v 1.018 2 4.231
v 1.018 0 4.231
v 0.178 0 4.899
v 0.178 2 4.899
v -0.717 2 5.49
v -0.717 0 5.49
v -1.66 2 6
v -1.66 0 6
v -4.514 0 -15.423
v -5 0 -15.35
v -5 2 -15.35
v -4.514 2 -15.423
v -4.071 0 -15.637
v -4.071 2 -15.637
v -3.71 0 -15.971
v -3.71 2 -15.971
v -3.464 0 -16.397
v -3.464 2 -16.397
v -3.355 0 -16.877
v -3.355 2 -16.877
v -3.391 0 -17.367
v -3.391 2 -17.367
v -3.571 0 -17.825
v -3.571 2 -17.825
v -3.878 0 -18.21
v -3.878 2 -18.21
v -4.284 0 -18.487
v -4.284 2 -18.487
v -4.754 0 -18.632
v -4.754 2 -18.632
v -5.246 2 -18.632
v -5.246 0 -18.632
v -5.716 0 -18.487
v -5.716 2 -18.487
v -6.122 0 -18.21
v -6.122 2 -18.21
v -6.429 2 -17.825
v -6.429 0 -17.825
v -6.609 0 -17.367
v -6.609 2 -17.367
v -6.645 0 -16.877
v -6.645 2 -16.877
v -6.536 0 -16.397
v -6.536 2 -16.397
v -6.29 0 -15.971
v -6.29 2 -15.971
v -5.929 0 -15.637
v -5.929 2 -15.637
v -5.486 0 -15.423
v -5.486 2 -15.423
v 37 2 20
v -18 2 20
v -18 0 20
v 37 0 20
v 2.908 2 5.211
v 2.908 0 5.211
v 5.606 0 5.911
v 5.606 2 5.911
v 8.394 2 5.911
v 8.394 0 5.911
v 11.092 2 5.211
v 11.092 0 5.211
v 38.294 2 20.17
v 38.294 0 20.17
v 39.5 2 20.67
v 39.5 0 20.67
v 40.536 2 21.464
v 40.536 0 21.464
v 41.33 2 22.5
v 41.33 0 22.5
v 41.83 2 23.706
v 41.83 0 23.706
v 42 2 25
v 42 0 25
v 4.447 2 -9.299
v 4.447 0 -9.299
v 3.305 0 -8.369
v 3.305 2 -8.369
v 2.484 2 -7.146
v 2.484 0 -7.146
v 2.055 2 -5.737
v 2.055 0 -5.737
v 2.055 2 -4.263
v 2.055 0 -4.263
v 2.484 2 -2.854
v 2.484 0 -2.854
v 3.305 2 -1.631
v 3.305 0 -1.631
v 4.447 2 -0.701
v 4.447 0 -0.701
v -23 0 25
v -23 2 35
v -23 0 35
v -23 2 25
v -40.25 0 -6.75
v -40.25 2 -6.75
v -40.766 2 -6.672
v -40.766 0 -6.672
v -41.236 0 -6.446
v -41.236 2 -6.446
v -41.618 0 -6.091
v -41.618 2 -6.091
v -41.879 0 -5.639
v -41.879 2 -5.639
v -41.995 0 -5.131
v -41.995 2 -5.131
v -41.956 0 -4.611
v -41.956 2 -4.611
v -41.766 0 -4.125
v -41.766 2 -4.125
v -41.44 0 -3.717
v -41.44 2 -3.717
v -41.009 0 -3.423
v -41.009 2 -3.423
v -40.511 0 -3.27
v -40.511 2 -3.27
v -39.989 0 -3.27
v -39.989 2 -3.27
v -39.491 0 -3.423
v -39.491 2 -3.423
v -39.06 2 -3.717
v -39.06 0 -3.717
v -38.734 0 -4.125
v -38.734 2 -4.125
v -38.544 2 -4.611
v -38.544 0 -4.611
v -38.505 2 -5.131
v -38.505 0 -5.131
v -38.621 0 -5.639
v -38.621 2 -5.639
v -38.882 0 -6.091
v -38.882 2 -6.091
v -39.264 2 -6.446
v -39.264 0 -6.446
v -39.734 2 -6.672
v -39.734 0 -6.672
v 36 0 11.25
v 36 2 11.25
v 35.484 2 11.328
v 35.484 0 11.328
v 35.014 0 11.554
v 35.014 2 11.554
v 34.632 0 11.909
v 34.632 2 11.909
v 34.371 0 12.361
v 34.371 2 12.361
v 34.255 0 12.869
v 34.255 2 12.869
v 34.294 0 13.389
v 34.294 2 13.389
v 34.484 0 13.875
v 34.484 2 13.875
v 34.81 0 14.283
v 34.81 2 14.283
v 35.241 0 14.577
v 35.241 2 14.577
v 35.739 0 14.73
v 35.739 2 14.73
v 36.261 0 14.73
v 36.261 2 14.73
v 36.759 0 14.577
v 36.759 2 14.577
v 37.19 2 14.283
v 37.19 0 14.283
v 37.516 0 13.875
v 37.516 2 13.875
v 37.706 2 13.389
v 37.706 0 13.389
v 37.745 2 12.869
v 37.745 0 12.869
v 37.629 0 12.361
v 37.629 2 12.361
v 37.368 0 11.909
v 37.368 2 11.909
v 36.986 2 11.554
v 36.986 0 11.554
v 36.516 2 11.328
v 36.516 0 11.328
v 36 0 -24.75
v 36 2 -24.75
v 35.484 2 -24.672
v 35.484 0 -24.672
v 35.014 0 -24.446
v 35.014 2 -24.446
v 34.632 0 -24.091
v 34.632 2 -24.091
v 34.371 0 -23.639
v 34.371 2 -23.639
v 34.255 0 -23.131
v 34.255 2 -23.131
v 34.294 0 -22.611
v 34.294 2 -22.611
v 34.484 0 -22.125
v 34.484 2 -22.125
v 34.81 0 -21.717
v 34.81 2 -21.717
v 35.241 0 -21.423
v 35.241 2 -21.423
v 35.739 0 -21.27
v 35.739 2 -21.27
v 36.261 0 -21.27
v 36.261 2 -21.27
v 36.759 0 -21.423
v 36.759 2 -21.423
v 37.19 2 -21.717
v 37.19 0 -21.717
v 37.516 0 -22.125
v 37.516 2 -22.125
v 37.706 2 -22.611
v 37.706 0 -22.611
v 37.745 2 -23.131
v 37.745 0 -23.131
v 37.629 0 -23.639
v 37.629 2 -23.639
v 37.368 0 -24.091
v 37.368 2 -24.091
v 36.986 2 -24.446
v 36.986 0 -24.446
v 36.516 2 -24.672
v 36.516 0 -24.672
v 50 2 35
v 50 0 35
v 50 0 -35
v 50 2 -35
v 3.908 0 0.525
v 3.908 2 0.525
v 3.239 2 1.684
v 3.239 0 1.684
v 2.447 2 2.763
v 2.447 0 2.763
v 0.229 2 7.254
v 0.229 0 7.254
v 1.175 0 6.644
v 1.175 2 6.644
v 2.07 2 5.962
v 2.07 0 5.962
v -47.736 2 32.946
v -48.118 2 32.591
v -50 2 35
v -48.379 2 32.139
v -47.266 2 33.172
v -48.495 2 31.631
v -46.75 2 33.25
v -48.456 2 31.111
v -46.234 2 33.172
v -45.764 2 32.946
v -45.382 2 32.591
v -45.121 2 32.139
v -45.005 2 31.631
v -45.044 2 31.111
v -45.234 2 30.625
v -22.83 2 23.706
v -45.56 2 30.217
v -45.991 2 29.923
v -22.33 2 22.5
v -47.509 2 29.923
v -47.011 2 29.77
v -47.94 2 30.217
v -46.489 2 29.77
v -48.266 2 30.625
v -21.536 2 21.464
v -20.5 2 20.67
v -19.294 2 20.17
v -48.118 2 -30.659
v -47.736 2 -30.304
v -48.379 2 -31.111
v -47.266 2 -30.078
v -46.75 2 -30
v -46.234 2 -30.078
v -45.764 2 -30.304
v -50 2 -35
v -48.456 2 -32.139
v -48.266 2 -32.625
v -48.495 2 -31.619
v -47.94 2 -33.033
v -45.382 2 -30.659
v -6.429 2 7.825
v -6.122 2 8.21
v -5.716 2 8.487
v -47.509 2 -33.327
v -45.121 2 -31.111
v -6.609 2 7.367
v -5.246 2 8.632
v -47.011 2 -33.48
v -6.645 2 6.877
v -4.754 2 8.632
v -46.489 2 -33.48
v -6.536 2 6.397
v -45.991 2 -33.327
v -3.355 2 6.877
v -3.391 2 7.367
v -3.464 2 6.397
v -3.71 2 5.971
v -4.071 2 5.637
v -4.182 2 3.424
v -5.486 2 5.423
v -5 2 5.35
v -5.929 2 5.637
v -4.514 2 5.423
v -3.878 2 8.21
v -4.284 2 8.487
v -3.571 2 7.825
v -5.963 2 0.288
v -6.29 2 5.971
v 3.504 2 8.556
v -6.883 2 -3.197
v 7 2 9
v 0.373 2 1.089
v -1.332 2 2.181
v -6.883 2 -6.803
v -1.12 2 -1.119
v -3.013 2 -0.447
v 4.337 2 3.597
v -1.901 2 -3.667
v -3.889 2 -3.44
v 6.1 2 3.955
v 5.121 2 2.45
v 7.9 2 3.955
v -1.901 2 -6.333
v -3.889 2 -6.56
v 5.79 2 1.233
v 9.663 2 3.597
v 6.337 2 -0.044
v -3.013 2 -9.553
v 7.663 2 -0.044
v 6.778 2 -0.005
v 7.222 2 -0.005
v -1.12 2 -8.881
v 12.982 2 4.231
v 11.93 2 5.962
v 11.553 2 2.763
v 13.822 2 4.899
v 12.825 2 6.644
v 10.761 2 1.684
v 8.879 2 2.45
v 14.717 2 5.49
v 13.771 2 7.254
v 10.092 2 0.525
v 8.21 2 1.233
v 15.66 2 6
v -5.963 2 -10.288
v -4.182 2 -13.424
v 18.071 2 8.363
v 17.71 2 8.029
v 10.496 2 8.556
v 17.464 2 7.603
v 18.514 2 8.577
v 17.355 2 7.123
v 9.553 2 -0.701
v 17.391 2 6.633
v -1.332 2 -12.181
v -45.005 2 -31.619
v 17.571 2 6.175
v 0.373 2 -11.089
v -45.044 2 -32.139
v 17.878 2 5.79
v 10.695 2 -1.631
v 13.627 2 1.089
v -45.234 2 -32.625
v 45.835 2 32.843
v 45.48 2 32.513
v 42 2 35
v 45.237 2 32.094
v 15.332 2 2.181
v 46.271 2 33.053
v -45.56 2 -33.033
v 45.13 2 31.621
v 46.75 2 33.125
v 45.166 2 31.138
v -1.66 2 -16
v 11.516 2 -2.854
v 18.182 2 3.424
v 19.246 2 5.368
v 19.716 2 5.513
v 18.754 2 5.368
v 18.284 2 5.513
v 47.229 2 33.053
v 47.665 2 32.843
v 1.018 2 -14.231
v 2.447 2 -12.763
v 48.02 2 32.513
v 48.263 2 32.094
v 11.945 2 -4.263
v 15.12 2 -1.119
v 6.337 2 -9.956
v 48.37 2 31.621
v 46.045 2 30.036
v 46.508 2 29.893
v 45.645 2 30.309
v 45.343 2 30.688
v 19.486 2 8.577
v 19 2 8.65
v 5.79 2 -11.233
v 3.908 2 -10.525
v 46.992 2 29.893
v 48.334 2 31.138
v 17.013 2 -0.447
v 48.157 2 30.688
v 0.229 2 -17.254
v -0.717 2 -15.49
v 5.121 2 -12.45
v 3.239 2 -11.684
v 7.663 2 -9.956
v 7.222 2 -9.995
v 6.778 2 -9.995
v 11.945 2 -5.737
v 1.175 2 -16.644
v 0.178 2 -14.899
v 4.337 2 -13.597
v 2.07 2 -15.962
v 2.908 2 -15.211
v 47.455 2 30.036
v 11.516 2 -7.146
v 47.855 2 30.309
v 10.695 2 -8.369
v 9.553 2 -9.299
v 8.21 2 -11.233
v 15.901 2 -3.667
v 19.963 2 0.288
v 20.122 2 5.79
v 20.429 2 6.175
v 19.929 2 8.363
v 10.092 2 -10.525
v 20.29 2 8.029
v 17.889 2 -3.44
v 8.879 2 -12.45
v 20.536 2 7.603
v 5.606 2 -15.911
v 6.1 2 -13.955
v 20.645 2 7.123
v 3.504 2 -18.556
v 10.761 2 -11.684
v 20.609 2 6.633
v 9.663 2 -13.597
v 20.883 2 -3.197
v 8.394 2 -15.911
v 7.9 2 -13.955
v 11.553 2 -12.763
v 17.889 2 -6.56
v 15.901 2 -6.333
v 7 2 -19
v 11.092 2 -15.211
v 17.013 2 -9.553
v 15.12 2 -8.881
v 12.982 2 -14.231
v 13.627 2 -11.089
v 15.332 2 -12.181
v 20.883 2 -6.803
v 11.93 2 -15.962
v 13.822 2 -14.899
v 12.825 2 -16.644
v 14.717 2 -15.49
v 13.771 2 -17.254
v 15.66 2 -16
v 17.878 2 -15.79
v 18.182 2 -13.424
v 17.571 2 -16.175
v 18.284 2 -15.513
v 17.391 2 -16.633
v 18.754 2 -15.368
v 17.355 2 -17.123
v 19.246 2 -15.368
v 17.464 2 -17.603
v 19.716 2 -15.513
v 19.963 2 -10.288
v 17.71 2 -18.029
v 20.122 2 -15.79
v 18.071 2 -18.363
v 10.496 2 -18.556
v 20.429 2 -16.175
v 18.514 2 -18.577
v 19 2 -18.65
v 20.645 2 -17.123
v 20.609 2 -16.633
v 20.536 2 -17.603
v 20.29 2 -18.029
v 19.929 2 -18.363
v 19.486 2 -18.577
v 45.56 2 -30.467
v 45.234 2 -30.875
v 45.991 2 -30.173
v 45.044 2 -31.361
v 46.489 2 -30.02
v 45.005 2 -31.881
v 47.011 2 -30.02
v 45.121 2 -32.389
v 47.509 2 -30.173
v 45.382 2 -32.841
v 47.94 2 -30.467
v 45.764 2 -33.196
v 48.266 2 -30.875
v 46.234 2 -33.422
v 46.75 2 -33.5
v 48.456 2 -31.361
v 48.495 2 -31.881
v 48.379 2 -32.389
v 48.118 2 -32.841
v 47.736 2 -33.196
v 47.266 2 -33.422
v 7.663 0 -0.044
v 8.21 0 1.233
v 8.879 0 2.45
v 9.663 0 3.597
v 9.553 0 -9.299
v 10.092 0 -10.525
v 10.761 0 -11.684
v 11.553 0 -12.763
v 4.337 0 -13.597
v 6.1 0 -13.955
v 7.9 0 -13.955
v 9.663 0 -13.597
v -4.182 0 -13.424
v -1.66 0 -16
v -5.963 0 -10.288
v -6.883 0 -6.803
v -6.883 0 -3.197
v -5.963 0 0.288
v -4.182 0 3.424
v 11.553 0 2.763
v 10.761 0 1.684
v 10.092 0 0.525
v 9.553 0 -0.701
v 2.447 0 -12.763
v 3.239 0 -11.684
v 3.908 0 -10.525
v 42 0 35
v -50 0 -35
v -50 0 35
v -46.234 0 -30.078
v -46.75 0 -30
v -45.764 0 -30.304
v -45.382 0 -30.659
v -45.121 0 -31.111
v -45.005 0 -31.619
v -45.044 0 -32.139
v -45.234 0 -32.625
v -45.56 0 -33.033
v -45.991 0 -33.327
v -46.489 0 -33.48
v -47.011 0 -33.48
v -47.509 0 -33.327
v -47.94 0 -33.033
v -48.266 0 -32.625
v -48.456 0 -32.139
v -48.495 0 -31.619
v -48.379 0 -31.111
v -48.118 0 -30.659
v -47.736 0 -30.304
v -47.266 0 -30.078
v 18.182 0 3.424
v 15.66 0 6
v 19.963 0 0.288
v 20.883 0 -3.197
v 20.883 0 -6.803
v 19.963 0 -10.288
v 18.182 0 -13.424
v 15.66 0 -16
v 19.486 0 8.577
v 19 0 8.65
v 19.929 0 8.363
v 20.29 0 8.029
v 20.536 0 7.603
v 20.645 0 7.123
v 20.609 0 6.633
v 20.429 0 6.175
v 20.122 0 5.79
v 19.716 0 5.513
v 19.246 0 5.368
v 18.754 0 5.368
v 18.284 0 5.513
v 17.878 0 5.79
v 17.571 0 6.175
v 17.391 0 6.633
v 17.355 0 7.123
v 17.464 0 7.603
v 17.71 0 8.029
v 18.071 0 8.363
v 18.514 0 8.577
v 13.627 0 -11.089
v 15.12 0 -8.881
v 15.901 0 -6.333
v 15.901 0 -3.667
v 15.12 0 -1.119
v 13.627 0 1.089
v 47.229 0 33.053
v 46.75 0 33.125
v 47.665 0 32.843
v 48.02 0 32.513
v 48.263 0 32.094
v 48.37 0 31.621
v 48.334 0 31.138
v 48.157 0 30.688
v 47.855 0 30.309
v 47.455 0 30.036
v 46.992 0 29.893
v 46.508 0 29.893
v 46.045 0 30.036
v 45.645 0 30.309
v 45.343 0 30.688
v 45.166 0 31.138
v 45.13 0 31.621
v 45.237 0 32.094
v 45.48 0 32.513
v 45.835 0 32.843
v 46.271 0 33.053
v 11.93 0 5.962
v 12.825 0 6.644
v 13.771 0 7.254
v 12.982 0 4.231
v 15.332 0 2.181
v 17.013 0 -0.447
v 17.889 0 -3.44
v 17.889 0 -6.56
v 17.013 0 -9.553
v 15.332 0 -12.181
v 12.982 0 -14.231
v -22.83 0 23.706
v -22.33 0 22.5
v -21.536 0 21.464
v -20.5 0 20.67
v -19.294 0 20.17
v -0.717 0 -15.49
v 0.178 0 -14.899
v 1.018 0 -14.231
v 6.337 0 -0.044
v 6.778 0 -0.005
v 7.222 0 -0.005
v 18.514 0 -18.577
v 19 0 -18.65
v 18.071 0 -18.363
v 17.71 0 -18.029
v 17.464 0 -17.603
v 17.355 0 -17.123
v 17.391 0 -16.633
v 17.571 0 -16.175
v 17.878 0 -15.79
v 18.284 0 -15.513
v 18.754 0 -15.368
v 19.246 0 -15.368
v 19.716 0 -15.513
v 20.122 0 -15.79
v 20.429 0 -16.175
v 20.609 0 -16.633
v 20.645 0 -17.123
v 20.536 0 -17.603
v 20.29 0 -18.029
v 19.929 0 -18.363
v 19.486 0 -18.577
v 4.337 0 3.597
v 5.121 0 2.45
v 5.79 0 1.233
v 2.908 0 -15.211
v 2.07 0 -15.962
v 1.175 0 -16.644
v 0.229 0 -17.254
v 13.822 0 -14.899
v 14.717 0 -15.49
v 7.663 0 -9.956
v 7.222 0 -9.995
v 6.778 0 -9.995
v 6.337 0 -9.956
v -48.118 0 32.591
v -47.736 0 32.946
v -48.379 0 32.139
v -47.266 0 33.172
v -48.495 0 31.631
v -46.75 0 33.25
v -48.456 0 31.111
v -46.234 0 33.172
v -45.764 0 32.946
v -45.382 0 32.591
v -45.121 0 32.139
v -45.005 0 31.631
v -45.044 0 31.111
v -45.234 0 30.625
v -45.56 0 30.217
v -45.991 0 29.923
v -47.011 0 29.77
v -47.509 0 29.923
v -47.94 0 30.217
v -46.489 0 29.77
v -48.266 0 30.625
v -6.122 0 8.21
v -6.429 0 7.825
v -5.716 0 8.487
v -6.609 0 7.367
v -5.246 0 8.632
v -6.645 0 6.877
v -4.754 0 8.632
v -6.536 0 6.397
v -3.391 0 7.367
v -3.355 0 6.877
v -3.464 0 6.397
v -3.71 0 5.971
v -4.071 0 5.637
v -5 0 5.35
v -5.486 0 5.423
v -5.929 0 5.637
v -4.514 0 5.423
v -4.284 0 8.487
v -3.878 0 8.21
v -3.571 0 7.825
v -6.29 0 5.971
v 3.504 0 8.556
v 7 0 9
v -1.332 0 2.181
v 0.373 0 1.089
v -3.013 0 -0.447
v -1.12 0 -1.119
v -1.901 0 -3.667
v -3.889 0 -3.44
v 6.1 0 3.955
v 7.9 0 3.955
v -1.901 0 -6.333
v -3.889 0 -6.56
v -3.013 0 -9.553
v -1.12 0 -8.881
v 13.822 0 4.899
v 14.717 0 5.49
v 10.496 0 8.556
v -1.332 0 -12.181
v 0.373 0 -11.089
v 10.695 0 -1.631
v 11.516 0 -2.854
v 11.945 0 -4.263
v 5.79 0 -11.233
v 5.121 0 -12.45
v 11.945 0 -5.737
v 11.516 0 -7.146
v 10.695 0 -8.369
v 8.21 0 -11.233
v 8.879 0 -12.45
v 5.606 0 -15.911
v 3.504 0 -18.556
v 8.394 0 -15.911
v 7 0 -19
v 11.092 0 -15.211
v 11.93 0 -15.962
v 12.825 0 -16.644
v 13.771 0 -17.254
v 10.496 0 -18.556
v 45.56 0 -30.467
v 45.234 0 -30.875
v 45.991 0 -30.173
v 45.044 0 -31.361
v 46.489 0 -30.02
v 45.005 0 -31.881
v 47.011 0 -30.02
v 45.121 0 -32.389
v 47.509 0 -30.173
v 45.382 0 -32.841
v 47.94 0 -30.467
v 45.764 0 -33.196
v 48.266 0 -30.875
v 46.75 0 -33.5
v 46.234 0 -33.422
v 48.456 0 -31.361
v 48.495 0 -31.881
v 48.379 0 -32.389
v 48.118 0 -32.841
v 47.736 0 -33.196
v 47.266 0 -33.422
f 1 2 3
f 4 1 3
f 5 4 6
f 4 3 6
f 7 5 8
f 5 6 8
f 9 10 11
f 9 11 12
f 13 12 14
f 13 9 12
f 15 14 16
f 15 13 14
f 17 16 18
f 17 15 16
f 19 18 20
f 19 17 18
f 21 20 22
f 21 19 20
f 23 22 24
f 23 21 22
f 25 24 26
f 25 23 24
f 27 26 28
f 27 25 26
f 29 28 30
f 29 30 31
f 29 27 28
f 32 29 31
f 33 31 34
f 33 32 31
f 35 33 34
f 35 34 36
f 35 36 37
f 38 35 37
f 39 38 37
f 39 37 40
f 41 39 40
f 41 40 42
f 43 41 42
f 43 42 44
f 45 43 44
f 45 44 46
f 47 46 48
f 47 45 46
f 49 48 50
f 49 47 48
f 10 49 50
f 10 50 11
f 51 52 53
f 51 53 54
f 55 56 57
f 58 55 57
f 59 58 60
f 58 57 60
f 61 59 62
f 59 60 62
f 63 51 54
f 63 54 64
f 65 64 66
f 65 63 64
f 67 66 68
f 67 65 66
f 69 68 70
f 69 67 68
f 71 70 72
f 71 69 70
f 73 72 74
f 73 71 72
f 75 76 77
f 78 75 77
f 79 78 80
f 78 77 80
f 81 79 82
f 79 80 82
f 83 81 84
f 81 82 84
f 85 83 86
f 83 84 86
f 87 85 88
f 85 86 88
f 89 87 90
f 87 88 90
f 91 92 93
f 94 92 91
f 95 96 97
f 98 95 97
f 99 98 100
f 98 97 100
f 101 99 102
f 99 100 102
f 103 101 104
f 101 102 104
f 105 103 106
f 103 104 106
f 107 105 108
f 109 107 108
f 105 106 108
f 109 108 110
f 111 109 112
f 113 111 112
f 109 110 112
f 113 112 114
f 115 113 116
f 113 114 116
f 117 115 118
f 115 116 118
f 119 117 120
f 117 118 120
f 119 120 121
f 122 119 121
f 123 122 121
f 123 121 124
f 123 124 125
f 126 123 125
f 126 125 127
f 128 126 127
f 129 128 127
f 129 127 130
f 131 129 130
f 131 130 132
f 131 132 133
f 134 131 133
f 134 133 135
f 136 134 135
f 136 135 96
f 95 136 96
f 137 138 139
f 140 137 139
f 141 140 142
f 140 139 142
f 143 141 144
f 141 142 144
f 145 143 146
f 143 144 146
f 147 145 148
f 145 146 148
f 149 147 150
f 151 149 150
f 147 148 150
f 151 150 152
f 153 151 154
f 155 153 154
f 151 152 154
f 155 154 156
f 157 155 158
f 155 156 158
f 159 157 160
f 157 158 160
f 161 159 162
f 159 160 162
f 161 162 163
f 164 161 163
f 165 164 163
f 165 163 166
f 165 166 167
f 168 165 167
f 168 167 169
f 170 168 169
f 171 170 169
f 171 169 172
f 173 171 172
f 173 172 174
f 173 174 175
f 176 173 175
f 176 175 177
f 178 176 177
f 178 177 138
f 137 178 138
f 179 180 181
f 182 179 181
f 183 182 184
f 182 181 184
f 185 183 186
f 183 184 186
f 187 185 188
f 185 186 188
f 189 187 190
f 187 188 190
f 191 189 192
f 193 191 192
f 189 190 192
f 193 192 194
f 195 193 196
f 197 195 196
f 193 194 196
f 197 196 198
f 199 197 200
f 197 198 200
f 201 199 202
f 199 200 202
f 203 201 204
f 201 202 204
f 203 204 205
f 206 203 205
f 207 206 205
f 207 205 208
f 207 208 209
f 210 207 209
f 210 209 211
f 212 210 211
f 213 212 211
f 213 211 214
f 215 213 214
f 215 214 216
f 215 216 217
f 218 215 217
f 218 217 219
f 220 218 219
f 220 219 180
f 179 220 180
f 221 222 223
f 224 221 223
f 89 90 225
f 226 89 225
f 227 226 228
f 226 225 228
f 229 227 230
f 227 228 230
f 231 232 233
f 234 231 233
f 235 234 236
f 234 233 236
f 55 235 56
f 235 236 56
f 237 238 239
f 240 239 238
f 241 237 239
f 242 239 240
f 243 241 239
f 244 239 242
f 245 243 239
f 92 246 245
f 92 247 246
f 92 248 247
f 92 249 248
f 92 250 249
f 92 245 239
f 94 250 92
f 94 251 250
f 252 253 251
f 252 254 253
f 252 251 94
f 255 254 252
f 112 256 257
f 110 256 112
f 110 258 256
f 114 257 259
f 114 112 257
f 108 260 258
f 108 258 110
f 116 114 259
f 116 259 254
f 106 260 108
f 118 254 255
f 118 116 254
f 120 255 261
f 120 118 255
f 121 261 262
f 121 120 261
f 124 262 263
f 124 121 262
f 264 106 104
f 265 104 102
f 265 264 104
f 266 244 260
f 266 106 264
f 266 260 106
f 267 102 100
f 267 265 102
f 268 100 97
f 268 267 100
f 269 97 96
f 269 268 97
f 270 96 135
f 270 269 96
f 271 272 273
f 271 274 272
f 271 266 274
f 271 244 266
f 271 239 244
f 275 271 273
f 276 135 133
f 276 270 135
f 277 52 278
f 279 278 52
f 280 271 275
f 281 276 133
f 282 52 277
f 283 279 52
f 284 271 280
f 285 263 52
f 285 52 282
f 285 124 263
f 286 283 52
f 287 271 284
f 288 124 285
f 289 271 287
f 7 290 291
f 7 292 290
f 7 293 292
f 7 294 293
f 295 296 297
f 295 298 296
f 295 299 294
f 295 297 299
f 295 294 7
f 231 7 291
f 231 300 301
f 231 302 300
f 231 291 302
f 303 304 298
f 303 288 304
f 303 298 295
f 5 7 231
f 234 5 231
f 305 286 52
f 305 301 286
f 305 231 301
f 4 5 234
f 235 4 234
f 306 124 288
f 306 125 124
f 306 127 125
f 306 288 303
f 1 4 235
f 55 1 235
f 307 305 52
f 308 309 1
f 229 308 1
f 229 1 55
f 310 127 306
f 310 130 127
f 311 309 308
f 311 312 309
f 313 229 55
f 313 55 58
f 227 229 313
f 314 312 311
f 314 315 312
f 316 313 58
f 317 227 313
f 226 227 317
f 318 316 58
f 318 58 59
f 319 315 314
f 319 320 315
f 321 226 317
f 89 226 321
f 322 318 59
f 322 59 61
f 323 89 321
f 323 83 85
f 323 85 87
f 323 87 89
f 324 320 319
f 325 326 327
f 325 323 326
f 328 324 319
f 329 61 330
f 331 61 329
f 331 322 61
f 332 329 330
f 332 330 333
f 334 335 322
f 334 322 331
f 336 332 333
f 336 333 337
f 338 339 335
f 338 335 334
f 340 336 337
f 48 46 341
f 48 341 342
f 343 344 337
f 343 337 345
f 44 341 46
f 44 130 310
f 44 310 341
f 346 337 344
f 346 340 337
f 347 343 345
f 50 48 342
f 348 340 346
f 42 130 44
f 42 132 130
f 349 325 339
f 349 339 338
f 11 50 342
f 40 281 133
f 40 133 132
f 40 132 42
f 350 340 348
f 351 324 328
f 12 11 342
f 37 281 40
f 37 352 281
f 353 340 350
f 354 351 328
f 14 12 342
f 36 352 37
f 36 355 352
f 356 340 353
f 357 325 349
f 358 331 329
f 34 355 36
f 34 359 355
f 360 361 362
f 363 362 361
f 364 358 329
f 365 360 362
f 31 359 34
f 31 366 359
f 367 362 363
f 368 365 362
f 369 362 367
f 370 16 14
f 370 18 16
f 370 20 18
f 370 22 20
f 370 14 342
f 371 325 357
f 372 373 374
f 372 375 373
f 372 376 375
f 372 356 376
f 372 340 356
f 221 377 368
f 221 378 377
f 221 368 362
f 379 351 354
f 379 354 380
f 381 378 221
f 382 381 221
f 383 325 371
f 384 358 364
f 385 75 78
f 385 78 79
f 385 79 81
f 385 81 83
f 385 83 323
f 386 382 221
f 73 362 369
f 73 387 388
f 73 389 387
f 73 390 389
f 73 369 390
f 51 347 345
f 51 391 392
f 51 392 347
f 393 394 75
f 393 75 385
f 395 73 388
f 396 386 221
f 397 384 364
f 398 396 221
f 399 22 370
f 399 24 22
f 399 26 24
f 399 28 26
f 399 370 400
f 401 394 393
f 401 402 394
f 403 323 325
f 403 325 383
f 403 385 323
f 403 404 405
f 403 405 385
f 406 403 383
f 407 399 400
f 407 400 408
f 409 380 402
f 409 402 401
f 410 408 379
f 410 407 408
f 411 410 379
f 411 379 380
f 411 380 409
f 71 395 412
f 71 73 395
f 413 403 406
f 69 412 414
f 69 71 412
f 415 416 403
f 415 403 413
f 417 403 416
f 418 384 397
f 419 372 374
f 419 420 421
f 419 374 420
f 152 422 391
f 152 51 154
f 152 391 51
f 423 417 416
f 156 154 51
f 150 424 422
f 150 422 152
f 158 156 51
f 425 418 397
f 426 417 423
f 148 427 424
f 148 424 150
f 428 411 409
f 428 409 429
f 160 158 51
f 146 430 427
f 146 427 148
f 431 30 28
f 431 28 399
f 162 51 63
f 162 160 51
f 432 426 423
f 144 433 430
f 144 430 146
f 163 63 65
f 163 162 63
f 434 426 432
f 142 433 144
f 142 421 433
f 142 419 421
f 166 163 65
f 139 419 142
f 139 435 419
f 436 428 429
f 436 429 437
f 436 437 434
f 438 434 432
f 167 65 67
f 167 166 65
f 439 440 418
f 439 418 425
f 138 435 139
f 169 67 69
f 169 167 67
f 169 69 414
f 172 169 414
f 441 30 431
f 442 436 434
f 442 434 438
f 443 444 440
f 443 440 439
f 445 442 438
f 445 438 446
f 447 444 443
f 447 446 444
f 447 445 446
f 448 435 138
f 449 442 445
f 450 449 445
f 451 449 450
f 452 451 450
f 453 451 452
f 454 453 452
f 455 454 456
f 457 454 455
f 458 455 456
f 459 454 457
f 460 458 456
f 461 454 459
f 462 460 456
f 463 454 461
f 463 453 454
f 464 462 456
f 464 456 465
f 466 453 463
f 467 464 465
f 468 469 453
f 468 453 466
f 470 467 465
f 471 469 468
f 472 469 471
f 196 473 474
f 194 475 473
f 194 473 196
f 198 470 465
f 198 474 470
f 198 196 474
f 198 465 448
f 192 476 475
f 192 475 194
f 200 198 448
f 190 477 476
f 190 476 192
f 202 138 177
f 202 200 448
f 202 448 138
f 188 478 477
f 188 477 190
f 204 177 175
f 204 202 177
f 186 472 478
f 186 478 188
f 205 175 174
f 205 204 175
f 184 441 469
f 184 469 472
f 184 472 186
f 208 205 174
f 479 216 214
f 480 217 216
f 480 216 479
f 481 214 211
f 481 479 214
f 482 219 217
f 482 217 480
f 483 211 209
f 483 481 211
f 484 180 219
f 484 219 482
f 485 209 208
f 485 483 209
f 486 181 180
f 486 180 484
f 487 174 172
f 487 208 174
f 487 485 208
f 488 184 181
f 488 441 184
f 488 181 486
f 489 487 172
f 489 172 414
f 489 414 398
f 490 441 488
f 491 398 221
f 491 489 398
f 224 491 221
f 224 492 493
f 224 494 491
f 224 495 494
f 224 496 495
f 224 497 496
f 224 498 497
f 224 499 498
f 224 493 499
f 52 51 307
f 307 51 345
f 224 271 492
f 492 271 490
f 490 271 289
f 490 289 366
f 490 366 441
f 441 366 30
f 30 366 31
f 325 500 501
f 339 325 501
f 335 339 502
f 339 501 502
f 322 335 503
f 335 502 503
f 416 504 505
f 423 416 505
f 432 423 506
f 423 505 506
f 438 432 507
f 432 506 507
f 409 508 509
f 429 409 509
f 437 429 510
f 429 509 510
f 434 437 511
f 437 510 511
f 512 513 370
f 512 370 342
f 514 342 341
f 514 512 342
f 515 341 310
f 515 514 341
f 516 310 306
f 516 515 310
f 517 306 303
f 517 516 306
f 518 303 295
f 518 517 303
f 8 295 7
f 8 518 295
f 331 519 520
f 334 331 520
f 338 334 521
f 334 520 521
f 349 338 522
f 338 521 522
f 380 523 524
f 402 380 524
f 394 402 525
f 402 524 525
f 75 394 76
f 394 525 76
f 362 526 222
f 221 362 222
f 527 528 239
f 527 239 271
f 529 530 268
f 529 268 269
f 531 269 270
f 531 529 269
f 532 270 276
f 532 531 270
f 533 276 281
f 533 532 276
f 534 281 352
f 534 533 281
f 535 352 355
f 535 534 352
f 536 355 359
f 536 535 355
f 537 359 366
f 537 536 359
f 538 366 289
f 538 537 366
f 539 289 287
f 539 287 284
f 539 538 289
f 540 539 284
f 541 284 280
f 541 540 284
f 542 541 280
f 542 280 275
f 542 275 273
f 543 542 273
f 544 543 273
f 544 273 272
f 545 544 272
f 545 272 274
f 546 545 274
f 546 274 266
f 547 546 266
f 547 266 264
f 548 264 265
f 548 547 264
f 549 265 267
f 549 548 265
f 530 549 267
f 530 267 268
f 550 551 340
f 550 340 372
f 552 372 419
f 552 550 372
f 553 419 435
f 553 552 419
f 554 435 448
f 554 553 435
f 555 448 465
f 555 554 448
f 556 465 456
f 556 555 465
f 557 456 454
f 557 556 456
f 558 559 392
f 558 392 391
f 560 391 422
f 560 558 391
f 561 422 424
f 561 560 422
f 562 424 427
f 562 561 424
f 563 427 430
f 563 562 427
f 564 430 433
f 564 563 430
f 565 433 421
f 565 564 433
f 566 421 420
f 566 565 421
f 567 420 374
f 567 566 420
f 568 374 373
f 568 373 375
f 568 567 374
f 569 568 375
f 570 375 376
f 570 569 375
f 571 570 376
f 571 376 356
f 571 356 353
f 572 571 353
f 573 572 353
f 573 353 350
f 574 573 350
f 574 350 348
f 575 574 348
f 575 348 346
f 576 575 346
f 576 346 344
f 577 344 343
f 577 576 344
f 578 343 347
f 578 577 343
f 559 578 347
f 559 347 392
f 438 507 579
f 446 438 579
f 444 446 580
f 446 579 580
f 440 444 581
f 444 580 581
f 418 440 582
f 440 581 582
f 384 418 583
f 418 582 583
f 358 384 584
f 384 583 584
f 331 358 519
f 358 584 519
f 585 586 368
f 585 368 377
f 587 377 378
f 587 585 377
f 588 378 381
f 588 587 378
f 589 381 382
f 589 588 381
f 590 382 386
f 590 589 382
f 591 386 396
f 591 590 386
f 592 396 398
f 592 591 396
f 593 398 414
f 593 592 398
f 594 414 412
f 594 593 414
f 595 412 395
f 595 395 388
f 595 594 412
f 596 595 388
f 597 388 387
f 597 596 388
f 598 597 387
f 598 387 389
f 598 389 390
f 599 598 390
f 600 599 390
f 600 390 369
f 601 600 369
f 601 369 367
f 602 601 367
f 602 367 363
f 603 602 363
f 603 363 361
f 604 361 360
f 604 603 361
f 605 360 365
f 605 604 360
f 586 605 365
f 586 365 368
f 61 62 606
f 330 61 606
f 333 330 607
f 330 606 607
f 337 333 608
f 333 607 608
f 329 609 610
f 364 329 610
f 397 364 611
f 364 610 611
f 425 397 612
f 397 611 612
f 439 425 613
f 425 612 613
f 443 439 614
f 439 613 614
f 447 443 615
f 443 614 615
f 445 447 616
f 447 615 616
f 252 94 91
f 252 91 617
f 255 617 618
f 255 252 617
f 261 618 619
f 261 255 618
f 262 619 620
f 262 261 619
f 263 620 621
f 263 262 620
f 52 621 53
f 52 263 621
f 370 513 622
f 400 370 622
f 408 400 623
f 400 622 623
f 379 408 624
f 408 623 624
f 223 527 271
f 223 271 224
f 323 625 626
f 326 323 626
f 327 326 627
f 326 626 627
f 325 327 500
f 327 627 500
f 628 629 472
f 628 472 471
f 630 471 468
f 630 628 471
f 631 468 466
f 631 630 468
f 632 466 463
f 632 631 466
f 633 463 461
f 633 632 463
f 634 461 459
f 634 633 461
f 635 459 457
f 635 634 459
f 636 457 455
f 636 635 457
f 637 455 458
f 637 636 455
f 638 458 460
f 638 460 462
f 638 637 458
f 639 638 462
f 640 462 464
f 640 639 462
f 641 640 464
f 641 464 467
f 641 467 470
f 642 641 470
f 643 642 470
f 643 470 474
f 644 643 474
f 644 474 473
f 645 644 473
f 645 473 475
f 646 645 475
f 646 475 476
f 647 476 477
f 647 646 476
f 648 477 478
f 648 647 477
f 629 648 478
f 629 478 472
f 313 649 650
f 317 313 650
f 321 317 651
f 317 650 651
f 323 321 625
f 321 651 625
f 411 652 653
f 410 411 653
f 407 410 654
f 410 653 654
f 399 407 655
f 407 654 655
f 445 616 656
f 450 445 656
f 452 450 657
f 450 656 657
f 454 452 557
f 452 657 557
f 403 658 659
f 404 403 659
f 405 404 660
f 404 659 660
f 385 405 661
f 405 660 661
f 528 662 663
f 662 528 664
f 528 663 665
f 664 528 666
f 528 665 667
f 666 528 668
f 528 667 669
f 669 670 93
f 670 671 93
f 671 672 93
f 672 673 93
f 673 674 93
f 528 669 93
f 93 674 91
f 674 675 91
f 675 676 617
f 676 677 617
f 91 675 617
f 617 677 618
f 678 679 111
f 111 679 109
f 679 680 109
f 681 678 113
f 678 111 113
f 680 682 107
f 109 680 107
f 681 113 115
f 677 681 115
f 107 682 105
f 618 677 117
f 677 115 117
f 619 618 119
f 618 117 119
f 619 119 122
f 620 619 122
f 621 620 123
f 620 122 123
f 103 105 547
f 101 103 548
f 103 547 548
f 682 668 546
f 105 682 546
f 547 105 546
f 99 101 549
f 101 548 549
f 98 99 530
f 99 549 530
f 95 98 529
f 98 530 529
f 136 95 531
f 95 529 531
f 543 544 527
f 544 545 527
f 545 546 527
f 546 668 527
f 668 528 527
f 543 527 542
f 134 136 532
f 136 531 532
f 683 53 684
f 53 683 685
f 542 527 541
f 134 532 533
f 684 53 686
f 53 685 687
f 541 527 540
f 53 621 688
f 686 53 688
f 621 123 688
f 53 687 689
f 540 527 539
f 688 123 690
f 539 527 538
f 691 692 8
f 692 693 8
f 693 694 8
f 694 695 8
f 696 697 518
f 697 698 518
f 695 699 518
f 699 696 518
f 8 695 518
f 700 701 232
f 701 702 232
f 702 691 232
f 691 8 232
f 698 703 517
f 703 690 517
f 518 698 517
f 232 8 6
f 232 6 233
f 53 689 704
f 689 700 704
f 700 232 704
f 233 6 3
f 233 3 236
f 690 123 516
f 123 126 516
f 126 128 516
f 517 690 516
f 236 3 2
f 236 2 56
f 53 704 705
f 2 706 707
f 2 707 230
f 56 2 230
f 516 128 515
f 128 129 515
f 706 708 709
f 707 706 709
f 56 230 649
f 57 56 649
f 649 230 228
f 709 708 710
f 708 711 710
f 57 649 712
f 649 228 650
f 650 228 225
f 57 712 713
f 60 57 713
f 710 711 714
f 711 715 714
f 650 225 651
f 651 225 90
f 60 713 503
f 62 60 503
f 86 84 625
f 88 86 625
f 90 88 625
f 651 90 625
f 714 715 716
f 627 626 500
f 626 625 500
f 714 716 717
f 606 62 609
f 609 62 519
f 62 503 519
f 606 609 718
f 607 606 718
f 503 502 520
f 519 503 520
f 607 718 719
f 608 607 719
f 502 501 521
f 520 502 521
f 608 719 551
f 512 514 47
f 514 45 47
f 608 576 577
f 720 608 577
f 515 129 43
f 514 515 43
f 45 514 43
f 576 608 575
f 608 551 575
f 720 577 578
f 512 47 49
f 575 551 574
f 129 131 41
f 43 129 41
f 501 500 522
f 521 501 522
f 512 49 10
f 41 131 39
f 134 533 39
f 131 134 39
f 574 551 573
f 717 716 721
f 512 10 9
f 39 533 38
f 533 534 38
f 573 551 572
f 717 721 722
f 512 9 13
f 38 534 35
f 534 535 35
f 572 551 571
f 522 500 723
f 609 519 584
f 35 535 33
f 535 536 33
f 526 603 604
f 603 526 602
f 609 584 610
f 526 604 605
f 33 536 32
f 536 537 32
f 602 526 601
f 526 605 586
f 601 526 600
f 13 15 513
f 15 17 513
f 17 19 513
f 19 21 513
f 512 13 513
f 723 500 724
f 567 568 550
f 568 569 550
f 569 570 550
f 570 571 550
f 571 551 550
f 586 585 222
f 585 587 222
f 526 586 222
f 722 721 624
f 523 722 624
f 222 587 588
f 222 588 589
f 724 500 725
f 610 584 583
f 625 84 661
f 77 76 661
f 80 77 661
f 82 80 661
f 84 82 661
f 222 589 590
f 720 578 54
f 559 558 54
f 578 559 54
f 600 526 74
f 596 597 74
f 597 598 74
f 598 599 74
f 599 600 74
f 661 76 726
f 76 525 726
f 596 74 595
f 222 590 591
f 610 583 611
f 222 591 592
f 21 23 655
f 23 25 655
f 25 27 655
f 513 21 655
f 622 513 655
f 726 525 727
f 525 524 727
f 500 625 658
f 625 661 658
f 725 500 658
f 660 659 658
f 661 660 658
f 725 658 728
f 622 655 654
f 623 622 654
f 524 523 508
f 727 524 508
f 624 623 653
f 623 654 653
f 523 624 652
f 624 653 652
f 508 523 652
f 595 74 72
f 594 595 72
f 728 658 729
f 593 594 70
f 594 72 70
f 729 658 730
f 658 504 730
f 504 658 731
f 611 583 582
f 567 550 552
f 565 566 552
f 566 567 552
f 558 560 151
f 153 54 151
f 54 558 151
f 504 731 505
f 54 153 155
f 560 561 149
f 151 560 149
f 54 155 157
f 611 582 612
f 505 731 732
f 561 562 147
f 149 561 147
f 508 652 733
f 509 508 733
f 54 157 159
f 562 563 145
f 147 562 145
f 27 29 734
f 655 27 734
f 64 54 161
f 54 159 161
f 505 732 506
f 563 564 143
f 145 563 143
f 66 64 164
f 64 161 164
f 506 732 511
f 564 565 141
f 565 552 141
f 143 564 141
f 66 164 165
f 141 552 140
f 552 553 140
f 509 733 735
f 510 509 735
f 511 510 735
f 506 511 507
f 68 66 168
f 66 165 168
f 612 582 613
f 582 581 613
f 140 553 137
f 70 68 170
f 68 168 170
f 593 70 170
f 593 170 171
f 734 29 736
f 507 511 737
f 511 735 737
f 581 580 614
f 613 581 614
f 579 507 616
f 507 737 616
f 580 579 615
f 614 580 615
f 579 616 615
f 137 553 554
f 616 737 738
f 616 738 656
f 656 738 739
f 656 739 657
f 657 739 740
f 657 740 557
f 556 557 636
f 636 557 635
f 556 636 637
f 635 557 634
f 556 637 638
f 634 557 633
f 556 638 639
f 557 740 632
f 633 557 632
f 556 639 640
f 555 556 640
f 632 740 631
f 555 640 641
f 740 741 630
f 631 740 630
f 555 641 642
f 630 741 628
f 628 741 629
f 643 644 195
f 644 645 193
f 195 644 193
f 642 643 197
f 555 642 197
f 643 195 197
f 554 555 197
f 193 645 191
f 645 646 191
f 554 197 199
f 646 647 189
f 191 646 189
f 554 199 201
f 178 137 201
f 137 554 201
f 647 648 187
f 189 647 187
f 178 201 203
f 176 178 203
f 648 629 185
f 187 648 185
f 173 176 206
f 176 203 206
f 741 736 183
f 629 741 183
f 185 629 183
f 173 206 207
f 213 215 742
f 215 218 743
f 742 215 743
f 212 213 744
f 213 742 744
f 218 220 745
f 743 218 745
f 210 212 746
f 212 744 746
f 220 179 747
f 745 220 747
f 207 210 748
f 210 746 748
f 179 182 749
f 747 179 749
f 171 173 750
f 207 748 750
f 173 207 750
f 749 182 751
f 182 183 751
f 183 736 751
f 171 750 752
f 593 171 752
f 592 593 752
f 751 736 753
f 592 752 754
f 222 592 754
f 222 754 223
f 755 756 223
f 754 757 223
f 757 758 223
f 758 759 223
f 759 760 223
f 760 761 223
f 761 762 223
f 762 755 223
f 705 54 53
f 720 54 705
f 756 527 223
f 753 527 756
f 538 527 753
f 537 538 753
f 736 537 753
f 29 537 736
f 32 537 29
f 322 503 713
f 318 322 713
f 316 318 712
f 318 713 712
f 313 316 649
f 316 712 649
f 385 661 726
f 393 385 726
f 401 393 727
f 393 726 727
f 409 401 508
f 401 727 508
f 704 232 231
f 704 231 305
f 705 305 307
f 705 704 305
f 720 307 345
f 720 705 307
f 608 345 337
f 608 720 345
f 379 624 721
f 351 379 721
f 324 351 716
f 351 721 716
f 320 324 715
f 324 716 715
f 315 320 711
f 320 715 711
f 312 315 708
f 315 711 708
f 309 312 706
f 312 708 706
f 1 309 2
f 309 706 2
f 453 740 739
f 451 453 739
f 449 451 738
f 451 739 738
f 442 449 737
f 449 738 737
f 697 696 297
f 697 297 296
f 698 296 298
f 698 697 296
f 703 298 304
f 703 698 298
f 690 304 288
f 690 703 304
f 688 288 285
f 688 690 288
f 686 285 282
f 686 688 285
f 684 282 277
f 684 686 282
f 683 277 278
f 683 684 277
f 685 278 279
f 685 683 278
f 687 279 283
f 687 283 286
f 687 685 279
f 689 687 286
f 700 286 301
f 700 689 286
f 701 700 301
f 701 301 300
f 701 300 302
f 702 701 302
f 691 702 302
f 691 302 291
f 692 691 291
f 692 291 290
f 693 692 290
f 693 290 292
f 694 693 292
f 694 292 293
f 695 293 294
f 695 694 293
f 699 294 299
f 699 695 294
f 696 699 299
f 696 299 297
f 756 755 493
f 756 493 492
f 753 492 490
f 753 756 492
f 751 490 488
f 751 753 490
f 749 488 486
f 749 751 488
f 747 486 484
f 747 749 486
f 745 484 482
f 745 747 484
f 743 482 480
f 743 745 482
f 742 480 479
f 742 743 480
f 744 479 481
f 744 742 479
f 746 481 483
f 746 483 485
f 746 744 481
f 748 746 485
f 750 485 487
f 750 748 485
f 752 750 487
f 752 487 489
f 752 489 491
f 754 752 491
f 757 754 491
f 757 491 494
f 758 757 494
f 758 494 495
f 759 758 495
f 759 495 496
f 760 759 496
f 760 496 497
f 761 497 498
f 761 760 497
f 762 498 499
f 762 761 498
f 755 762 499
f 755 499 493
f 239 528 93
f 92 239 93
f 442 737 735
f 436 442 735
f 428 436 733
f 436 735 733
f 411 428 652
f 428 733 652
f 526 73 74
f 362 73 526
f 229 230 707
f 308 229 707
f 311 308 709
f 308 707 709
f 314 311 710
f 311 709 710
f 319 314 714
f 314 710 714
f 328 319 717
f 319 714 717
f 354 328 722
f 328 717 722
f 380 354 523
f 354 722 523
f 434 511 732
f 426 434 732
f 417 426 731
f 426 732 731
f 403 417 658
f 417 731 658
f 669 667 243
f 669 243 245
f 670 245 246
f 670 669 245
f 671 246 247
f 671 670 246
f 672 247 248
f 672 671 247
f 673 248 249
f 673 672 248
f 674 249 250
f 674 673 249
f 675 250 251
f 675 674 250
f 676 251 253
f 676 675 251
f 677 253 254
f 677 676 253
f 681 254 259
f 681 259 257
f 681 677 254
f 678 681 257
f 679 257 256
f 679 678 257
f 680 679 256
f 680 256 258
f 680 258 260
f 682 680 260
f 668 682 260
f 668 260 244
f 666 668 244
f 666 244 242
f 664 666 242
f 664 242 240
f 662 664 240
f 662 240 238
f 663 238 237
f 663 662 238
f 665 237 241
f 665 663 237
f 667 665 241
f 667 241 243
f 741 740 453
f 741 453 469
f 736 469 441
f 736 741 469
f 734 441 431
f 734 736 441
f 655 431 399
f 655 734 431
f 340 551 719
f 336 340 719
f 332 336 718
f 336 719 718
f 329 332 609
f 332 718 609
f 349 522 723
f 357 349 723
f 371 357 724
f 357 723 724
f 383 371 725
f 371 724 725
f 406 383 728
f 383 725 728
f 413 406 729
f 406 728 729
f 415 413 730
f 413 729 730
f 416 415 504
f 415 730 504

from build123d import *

# Parameters (mm, degrees)
SKETCH1_W           = 100
SKETCH1_H           = 70
SKETCH1_R           = 1.75
SKETCH1_R_2         = 1.625
SKETCH1_R_3         = 14
SKETCH1_R_4         = 1.65
BOSS_EXTRUDE2_DEPTH = 2
CUT_EXTRUDE1_REACH  = 63.066
BOSS_EXTRUDE5_START = -2
BOSS_EXTRUDE5_DEPTH = 2
SKETCH11_R          = 1.75
CUT_EXTRUDE3_DEPTH  = 62.065538563


with BuildPart() as part:
    # Sketch1 → Boss-Extrude2 (new body)
    with BuildSketch(Plane(origin=(0, 0, 0), x_dir=(1, 0, 0), z_dir=(0, 1, 0))):
        Rectangle(SKETCH1_W, SKETCH1_H)
        with Locations(Location((-46.75, 31.75, 0), (0, 0, 270))):
            Circle(SKETCH1_R, mode=Mode.SUBTRACT)
        with Locations(Location((46.75, 31.75, 0), (0, 0, 90))):
            Circle(SKETCH1_R, mode=Mode.SUBTRACT)
        with Locations(Location((-46.75, -31.5, 0), (0, 0, 270))):
            Circle(SKETCH1_R, mode=Mode.SUBTRACT)
        with Locations(Location((46.75, -31.5, 0), (0, 0, 270))):
            Circle(SKETCH1_R_2, mode=Mode.SUBTRACT)
        with Locations(Location((7, 5, 0), (0, 0, 270))):
            Circle(SKETCH1_R_3, mode=Mode.SUBTRACT)
        with Locations(Location((-5, 17, 0), (0, 0, 270))):
            Circle(SKETCH1_R_4, mode=Mode.SUBTRACT)
        with Locations(Location((-5, -7, 0), (0, 0, 90))):
            Circle(SKETCH1_R_4, mode=Mode.SUBTRACT)
        with Locations(Location((19, -7, 0), (0, 0, 270))):
            Circle(SKETCH1_R_4, mode=Mode.SUBTRACT)
        with Locations(Location((19, 17, 0), (0, 0, 90))):
            Circle(SKETCH1_R_4, mode=Mode.SUBTRACT)
    extrude(amount=BOSS_EXTRUDE2_DEPTH)

    # Sketch2 → Cut-Extrude1 (cut, up to next)
    with BuildSketch(Plane(origin=(0, 2, 0), x_dir=(1, 0, 0), z_dir=(0, 1, 0)), mode=Mode.PRIVATE) as cut_extrude1_sk1:
        with BuildLine():
            Line((-18, -20), (37, -20))
            ThreePointArc((37, -20), (40.535533906, -21.464466094), (42, -25))
            Line((42, -25), (42, -35))
            Line((42, -35), (-23, -35))
            Line((-23, -35), (-23, -25))
            ThreePointArc((-23, -25), (-21.535533906, -21.464466094), (-18, -20))
        make_face()
    cut_extrude1_tool1 = extrude(cut_extrude1_sk1.sketch, amount=-CUT_EXTRUDE1_REACH, mode=Mode.PRIVATE) & part.part
    add(cut_extrude1_tool1.solids().sort_by_distance((9.5, 2, 27.57103))[0], mode=Mode.SUBTRACT)

    # Sketch3 → Boss-Extrude5 (add)
    with BuildSketch(Plane(origin=(0, 2, 0), x_dir=(1, 0, 0), z_dir=(0, 1, 0)).offset(BOSS_EXTRUDE5_START)):
        with BuildLine():
            ThreePointArc((2.907966853, -5.21054674), (7, -6), (11.092033147, -5.21054674))
            ThreePointArc((11.092033147, -5.21054674), (12.370622562, -6.311804318), (13.770604576, -7.25393462))
            ThreePointArc((13.770604576, -7.25393462), (14.740861541, -6.665293078), (15.660254038, -6))
            ThreePointArc((15.660254038, -6), (14.262684823, -5.203992902), (12.981682609, -4.231439387))
            ThreePointArc((12.981682609, -4.231439387), (18, 5), (12.981682609, 14.231439387))
            ThreePointArc((12.981682609, 14.231439387), (14.262684823, 15.203992902), (15.660254038, 16))
            ThreePointArc((15.660254038, 16), (14.740861541, 16.665293078), (13.770604576, 17.25393462))
            ThreePointArc((13.770604576, 17.25393462), (12.370622562, 16.311804318), (11.092033147, 15.21054674))
            ThreePointArc((11.092033147, 15.21054674), (7, 16), (2.907966853, 15.21054674))
            ThreePointArc((2.907966853, 15.21054674), (1.629377438, 16.311804318), (0.229395424, 17.25393462))
            ThreePointArc((0.229395424, 17.25393462), (-0.740861541, 16.665293078), (-1.660254038, 16))
            ThreePointArc((-1.660254038, 16), (-0.262684823, 15.203992902), (1.018317391, 14.231439387))
            ThreePointArc((1.018317391, 14.231439387), (-4, 5), (1.018317391, -4.231439387))
            ThreePointArc((1.018317391, -4.231439387), (-0.262684823, -5.203992902), (-1.660254038, -6))
            ThreePointArc((-1.660254038, -6), (-0.740861541, -6.665293078), (0.229395424, -7.25393462))
            ThreePointArc((0.229395424, -7.25393462), (1.629377438, -6.311804318), (2.907966853, -5.21054674))
        make_face()
        with BuildLine():
            ThreePointArc((6.336538282, 0.04421363), (7, 0), (7.663461718, 0.04421363))
            ThreePointArc((7.663461718, 0.04421363), (8.529854537, -1.849711236), (9.663461718, -3.596858244))
            ThreePointArc((9.663461718, -3.596858244), (7, -4), (4.336538282, -3.596858244))
            ThreePointArc((4.336538282, -3.596858244), (5.470145463, -1.849711236), (6.336538282, 0.04421363))
        make_face(mode=Mode.SUBTRACT)
        with BuildLine():
            ThreePointArc((4.446888819, 9.299025855), (2, 5), (4.446888819, 0.700974145))
            ThreePointArc((4.446888819, 0.700974145), (3.589514818, -1.113514772), (2.446888819, -2.763322651))
            ThreePointArc((2.446888819, -2.763322651), (-2, 5), (2.446888819, 12.763322651))
            ThreePointArc((2.446888819, 12.763322651), (3.589514818, 11.113514772), (4.446888819, 9.299025855))
        make_face(mode=Mode.SUBTRACT)
        with BuildLine():
            ThreePointArc((9.663461718, 13.596858244), (8.529854537, 11.849711236), (7.663461718, 9.95578637))
            ThreePointArc((7.663461718, 9.95578637), (7, 10), (6.336538282, 9.95578637))
            ThreePointArc((6.336538282, 9.95578637), (5.470145463, 11.849711236), (4.336538282, 13.596858244))
            ThreePointArc((4.336538282, 13.596858244), (7, 14), (9.663461718, 13.596858244))
        make_face(mode=Mode.SUBTRACT)
        with BuildLine():
            ThreePointArc((11.553111181, -2.763322651), (10.410485182, -1.113514772), (9.553111181, 0.700974145))
            ThreePointArc((9.553111181, 0.700974145), (12, 5), (9.553111181, 9.299025855))
            ThreePointArc((9.553111181, 9.299025855), (10.410485182, 11.113514772), (11.553111181, 12.763322651))
            ThreePointArc((11.553111181, 12.763322651), (16, 5), (11.553111181, -2.763322651))
        make_face(mode=Mode.SUBTRACT)
    extrude(amount=BOSS_EXTRUDE5_DEPTH)

    # Sketch11 → Cut-Extrude3 (cut, through all)
    with BuildSketch(Plane(origin=(0, 2, 0), x_dir=(1, 0, 0), z_dir=(0, 1, 0))):
        with Locations(Location((-40.25, 5, 0), (0, 0, 90))):
            Circle(SKETCH11_R)
        with Locations(Location((36, 23, 0), (0, 0, 90))):
            Circle(SKETCH11_R)
        with Locations(Location((36, -13, 0), (0, 0, 90))):
            Circle(SKETCH11_R)
    extrude(amount=-CUT_EXTRUDE3_DEPTH, mode=Mode.SUBTRACT)


solid = part.part
